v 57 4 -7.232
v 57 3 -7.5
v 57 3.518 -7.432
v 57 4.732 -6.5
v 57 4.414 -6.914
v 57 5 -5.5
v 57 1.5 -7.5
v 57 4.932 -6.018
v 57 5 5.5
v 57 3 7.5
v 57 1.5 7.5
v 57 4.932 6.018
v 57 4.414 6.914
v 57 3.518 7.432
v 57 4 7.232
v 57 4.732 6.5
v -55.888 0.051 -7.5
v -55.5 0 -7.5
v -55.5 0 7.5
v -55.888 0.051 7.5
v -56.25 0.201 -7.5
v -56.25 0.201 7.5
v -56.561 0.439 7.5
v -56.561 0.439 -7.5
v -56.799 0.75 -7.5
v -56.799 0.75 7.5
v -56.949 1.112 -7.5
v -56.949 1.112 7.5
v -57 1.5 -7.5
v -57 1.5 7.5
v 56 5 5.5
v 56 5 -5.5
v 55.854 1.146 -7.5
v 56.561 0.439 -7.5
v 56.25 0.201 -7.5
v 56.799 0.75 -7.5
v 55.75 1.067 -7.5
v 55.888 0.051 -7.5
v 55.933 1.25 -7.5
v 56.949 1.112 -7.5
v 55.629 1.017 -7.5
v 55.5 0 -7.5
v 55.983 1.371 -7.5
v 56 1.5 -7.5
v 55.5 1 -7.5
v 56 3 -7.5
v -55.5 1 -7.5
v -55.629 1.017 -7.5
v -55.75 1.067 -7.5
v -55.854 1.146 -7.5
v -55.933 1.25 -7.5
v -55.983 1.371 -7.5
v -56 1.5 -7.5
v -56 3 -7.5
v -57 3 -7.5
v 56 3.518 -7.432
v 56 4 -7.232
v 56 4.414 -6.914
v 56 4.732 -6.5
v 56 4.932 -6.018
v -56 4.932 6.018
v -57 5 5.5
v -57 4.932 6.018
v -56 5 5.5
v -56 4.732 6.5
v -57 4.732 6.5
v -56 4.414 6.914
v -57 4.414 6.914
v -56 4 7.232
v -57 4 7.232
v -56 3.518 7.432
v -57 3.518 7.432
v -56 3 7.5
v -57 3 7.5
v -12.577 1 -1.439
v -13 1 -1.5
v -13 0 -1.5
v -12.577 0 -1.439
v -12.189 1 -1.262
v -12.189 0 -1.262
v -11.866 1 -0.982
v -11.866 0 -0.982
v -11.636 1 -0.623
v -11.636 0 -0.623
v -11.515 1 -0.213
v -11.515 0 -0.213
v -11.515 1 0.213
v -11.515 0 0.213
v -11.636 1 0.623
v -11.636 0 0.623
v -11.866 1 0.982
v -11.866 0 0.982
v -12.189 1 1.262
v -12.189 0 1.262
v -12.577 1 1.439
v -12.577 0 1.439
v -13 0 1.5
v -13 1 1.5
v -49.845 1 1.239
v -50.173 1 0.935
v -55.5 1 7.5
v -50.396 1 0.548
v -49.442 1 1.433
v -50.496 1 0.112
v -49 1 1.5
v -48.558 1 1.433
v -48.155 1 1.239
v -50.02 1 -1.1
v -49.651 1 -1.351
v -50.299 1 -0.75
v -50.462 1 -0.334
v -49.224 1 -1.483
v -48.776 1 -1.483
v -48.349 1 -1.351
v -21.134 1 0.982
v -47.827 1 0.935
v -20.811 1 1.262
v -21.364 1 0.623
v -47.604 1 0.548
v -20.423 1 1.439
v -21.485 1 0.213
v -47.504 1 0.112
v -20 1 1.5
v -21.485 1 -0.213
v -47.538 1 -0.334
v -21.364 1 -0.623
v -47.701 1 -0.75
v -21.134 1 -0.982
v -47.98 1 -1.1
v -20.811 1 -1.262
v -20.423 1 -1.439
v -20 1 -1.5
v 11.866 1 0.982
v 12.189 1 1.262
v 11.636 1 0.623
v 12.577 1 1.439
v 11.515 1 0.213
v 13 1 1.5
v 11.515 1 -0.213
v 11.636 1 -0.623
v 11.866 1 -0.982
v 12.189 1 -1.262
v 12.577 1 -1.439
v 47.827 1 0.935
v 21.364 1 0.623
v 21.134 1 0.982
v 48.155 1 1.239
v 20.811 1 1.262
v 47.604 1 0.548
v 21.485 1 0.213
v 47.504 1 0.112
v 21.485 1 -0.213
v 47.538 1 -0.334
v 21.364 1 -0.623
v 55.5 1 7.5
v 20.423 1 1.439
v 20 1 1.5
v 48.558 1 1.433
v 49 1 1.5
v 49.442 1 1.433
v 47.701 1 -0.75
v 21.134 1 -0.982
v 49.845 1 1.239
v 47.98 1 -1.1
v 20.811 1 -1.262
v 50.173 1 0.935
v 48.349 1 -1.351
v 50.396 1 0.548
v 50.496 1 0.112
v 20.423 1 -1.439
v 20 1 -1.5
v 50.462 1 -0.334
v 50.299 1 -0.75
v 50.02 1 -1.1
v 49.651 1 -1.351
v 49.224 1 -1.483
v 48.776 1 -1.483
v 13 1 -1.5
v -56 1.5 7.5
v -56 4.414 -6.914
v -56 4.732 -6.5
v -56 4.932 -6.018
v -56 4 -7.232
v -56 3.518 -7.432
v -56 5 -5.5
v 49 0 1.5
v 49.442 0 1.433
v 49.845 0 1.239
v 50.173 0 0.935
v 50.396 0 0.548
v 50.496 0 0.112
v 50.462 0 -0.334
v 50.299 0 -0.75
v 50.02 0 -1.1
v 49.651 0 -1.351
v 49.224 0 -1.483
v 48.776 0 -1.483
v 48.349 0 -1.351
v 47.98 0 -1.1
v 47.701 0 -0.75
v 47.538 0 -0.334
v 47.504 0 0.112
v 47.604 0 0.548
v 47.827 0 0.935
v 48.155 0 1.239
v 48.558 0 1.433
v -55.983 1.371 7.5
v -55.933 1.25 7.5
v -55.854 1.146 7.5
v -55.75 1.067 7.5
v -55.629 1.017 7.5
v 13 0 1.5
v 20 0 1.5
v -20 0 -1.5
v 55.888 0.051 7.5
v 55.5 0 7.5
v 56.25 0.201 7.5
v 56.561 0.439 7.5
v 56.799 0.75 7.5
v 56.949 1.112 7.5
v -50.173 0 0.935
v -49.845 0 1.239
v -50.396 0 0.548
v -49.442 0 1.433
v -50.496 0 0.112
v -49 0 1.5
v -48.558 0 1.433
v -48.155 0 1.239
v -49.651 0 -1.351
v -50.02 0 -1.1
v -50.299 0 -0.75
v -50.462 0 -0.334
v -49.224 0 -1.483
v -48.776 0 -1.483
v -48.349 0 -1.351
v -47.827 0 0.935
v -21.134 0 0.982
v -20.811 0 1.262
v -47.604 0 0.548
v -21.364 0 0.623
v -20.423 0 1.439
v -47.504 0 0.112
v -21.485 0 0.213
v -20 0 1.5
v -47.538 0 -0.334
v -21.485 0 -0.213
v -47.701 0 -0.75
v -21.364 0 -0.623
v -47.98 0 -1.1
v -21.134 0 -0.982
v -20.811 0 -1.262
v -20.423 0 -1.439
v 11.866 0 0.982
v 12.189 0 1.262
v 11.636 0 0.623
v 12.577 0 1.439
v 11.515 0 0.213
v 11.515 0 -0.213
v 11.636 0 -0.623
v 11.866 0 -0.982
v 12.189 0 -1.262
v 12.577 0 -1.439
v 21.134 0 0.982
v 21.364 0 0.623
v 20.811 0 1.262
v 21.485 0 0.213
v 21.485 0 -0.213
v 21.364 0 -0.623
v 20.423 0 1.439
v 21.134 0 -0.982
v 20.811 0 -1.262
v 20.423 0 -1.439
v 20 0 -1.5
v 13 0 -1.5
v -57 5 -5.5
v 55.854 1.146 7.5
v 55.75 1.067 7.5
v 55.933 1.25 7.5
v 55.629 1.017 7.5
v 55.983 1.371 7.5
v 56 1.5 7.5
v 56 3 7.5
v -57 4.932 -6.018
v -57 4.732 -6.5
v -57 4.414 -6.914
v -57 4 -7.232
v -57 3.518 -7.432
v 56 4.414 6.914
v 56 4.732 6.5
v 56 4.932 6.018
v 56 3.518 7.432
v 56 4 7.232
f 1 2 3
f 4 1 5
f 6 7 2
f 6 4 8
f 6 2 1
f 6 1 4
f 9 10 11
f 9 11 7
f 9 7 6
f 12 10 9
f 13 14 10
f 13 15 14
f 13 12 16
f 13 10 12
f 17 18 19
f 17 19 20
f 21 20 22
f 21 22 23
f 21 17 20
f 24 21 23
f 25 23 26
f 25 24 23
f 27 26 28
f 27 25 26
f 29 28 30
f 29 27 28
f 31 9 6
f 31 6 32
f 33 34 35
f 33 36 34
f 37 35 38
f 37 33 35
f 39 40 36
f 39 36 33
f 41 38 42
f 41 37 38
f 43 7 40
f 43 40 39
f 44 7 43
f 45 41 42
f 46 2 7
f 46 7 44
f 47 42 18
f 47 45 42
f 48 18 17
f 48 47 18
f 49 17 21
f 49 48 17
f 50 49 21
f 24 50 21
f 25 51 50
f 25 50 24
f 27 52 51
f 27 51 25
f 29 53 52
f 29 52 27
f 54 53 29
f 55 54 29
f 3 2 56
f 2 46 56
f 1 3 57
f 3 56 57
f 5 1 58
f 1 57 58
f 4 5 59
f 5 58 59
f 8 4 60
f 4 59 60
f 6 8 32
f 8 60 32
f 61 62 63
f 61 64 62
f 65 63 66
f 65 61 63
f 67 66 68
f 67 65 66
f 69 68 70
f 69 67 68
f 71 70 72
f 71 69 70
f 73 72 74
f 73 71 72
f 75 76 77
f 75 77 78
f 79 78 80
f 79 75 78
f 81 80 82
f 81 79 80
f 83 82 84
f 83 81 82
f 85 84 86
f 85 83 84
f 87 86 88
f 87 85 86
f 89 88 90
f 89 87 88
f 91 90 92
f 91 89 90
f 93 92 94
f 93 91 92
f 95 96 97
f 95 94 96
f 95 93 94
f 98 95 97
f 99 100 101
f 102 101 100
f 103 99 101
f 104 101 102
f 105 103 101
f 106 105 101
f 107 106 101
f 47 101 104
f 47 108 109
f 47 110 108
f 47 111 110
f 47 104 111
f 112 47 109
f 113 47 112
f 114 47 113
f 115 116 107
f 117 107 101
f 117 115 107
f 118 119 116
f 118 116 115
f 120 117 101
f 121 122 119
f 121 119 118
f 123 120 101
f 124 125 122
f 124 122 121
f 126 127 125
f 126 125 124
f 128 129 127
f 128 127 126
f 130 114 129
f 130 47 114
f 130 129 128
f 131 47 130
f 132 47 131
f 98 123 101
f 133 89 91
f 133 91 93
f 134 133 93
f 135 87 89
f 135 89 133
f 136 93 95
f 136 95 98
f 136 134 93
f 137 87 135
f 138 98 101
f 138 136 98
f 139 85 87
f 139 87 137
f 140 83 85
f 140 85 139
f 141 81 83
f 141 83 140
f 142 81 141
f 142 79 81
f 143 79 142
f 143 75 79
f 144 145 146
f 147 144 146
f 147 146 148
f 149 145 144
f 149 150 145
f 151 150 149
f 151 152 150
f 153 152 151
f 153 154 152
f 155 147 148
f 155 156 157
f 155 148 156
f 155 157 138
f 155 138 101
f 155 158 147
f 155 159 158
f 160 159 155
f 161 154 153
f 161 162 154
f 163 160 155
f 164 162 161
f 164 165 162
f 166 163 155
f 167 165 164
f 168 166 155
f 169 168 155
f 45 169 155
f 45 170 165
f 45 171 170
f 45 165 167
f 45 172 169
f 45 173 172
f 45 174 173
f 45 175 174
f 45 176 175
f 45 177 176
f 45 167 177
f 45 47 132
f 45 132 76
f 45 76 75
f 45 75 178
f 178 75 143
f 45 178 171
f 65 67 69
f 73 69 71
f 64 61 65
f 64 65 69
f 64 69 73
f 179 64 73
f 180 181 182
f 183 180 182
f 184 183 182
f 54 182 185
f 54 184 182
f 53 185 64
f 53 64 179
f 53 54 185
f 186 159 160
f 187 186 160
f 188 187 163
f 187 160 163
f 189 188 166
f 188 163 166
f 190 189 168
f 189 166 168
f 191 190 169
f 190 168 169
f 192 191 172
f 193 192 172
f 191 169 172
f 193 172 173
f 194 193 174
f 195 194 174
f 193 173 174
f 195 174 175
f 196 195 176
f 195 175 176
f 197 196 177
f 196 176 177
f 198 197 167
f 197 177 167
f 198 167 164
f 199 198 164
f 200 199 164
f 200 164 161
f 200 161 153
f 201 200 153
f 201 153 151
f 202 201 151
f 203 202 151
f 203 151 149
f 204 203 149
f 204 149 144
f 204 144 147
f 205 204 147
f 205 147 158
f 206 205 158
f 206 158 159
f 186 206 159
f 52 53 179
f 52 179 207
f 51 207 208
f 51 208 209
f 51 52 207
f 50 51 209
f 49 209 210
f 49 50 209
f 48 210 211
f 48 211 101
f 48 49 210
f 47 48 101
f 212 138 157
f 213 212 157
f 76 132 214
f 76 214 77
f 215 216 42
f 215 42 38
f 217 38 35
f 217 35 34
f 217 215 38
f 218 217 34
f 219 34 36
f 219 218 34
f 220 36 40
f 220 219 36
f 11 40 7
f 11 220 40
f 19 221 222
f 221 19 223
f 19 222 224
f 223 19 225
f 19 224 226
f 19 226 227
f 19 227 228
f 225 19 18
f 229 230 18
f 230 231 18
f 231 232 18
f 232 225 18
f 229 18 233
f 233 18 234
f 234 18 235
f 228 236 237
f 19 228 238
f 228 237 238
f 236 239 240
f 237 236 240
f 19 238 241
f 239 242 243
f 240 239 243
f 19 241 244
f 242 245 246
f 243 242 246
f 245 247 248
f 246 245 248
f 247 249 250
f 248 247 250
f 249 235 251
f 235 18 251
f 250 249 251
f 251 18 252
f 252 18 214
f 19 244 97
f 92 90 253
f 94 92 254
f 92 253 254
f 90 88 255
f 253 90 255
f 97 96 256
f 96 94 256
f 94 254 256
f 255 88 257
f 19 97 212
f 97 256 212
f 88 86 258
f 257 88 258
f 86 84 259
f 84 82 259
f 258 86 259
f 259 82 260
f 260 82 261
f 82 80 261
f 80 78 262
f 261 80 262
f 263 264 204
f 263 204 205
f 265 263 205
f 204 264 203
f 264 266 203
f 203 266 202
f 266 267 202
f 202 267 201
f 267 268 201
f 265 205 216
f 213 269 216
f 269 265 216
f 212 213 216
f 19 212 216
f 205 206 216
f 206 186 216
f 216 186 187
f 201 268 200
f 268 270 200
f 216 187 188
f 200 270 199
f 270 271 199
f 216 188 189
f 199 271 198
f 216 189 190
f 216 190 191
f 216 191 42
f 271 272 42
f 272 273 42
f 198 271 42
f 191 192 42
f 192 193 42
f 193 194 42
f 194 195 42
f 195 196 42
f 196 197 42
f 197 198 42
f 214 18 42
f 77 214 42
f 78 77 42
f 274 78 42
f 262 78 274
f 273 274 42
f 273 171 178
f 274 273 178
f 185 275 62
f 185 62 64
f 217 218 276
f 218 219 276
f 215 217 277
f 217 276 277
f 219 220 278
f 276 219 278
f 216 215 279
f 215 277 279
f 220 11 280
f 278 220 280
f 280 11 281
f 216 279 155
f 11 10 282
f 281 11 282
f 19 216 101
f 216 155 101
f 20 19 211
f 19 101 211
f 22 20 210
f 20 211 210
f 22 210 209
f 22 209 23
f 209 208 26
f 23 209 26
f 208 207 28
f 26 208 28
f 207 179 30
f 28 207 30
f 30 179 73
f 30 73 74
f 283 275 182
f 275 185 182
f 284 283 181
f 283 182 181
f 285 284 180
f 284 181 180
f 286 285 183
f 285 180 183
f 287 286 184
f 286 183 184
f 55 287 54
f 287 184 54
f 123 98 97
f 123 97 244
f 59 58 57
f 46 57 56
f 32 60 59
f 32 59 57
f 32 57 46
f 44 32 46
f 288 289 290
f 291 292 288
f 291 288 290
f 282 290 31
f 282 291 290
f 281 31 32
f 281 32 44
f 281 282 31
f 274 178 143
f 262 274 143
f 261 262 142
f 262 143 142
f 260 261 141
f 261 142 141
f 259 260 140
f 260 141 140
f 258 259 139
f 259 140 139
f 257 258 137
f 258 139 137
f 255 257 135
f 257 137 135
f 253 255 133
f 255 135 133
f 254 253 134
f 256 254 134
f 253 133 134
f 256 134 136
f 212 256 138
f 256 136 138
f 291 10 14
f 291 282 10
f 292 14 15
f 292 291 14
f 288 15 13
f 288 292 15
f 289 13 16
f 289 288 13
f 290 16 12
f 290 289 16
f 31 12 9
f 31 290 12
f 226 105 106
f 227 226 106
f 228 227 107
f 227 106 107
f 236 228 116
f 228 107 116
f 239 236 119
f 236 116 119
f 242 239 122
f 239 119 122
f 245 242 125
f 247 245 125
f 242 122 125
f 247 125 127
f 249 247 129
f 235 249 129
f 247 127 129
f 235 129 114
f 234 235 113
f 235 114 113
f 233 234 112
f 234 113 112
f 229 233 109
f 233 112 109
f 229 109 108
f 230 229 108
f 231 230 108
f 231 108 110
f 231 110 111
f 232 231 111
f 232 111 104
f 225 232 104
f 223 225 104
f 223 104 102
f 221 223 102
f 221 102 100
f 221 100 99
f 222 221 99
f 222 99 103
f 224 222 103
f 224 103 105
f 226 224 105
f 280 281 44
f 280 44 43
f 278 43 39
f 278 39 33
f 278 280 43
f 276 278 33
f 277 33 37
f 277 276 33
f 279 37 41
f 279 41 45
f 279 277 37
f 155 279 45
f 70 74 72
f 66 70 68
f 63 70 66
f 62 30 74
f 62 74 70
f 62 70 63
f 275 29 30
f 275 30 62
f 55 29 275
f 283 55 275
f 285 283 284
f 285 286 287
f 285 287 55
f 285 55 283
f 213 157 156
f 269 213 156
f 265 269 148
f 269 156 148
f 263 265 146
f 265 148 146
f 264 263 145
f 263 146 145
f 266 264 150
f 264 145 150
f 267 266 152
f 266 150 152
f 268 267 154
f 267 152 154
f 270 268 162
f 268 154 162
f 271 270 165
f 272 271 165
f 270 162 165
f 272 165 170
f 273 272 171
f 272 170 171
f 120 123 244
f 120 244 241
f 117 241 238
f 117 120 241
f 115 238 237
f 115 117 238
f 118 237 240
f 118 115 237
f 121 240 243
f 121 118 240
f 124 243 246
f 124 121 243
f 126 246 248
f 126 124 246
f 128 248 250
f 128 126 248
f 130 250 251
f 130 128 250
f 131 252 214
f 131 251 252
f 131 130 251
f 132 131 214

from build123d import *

# Parameters (mm, degrees)
SKETCH_1_W                         = 114
SKETCH_1_H                         = 15
EXTRUDE_1_DEPTH                    = 1
SM_EDGE_FLANGE_1_STRIP_W           = 5
SM_EDGE_FLANGE_1_STRIP_H           = 1
SM_EDGE_FLANGE_1_STRIP_CUT_DEPTH   = 15
SM_EDGE_FLANGE_1_STRIP_2_W         = 5
SM_EDGE_FLANGE_1_STRIP_2_H         = 1
SM_EDGE_FLANGE_1_STRIP_CUT_2_DEPTH = 15
SM_EDGE_FLANGE_1_DEPTH             = 15
SM_EDGE_FLANGE_1_BEND_DEPTH        = 15
CUT_EXTRUDE_1_DEPTH                = 58.630287176
SKETCH_13_R                        = 1.5
CUT_EXTRUDE_2_DEPTH                = 5
FILLET_1_R                         = 2


# Sheet-metal steps are written as plain solids
with BuildPart() as part:
    # Sketch 1 → Бобышка-Вытянуть1 (new body)
    with BuildSketch(Plane(origin=(0, 0, 0), x_dir=(1, 0, 0), z_dir=(0, 1, 0))):
        Rectangle(SKETCH_1_W, SKETCH_1_H)
    extrude(amount=EXTRUDE_1_DEPTH)

    # Ребро-кромка1 strip (across the edge) → Ребро-кромка1 strip cut (cut)
    with BuildSketch(Plane(origin=(57, 1, 7.5), x_dir=(-1, 0, 0), z_dir=(0, 0, -1))):
        with Locations((-1, -0.5)):
            Rectangle(SM_EDGE_FLANGE_1_STRIP_W, SM_EDGE_FLANGE_1_STRIP_H)
    extrude(amount=SM_EDGE_FLANGE_1_STRIP_CUT_DEPTH, mode=Mode.SUBTRACT)

    # Ребро-кромка1 strip 2 (across the edge) → Ребро-кромка1 strip cut 2 (cut)
    with BuildSketch(Plane(origin=(-57, 1, -7.5), x_dir=(1, 0, 0), z_dir=(0, 0, 1))):
        with Locations((-1, -0.5)):
            Rectangle(SM_EDGE_FLANGE_1_STRIP_2_W, SM_EDGE_FLANGE_1_STRIP_2_H)
    extrude(amount=SM_EDGE_FLANGE_1_STRIP_CUT_2_DEPTH, mode=Mode.SUBTRACT)

    # Ребро-кромка1 section (across the edge) → Ребро-кромка1 (add)
    with BuildSketch(Plane(origin=(57, 1, 7.5), x_dir=(-1, 0, 0), z_dir=(0, 0, -1))):
        with BuildLine():
            Line((0, 0.5), (0, 4))
            Line((0, 4), (1, 4))
            Line((1, 4), (1, 0.5))
            ThreePointArc((1, 0.5), (1.146446609, 0.146446609), (1.5, 0))
            Line((1.5, 0), (1.5, -1))
            ThreePointArc((1.5, -1), (0.439339828, -0.560660172), (0, 0.5))
        make_face()
    extrude(amount=SM_EDGE_FLANGE_1_DEPTH)

    # Ребро-кромка1 section 2 (across the edge) → Ребро-кромка1 bend (add)
    with BuildSketch(Plane(origin=(-57, 1, -7.5), x_dir=(1, 0, 0), z_dir=(0, 0, 1))):
        with BuildLine():
            Line((0, 0.5), (0, 4))
            Line((0, 4), (1, 4))
            Line((1, 4), (1, 0.5))
            ThreePointArc((1, 0.5), (1.146446609, 0.146446609), (1.5, 0))
            Line((1.5, 0), (1.5, -1))
            ThreePointArc((1.5, -1), (0.439339828, -0.560660172), (0, 0.5))
        make_face()
    extrude(amount=SM_EDGE_FLANGE_1_BEND_DEPTH)

    # Эскиз12 → Вырез-Вытянуть1 (cut, through all)
    with BuildSketch(Plane(origin=(0, 1, 0), x_dir=(1, 0, 0), z_dir=(0, 1, 0))):
        with BuildLine():
            Line((-20, 1.5), (-13, 1.5))
            ThreePointArc((-13, 1.5), (-11.5, 0), (-13, -1.5))
            Line((-13, -1.5), (-20, -1.5))
            ThreePointArc((-20, -1.5), (-21.5, 0), (-20, 1.5))
        make_face()
        with BuildLine():
            Line((20, 1.5), (13, 1.5))
            ThreePointArc((13, 1.5), (11.5, 0), (13, -1.5))
            Line((13, -1.5), (20, -1.5))
            ThreePointArc((20, -1.5), (21.5, 0), (20, 1.5))
        make_face()
    extrude(amount=-CUT_EXTRUDE_1_DEPTH, mode=Mode.SUBTRACT)

    # Эскиз13 → Вырез-Вытянуть2 (cut)
    with BuildSketch(Plane(origin=(0, 1, 0), x_dir=(1, 0, 0), z_dir=(0, 1, 0))):
        with Locations(Location((-49, 0, 0), (0, 0, 270))):
            Circle(SKETCH_13_R)
        with Locations(Location((49, 0, 0), (0, 0, 270))):
            Circle(SKETCH_13_R)
    extrude(amount=-CUT_EXTRUDE_2_DEPTH, mode=Mode.SUBTRACT)

    # Скругление1
    fillet_1_edges = [part.edges().sort_by_distance(p)[0] for p in [
        (56.5, 5, 7.5),
        (56.5, 5, -7.5),
        (-56.5, 5, -7.5),
        (-56.5, 5, 7.5),
    ]]
    fillet(fillet_1_edges, radius=FILLET_1_R)


solid = part.part
